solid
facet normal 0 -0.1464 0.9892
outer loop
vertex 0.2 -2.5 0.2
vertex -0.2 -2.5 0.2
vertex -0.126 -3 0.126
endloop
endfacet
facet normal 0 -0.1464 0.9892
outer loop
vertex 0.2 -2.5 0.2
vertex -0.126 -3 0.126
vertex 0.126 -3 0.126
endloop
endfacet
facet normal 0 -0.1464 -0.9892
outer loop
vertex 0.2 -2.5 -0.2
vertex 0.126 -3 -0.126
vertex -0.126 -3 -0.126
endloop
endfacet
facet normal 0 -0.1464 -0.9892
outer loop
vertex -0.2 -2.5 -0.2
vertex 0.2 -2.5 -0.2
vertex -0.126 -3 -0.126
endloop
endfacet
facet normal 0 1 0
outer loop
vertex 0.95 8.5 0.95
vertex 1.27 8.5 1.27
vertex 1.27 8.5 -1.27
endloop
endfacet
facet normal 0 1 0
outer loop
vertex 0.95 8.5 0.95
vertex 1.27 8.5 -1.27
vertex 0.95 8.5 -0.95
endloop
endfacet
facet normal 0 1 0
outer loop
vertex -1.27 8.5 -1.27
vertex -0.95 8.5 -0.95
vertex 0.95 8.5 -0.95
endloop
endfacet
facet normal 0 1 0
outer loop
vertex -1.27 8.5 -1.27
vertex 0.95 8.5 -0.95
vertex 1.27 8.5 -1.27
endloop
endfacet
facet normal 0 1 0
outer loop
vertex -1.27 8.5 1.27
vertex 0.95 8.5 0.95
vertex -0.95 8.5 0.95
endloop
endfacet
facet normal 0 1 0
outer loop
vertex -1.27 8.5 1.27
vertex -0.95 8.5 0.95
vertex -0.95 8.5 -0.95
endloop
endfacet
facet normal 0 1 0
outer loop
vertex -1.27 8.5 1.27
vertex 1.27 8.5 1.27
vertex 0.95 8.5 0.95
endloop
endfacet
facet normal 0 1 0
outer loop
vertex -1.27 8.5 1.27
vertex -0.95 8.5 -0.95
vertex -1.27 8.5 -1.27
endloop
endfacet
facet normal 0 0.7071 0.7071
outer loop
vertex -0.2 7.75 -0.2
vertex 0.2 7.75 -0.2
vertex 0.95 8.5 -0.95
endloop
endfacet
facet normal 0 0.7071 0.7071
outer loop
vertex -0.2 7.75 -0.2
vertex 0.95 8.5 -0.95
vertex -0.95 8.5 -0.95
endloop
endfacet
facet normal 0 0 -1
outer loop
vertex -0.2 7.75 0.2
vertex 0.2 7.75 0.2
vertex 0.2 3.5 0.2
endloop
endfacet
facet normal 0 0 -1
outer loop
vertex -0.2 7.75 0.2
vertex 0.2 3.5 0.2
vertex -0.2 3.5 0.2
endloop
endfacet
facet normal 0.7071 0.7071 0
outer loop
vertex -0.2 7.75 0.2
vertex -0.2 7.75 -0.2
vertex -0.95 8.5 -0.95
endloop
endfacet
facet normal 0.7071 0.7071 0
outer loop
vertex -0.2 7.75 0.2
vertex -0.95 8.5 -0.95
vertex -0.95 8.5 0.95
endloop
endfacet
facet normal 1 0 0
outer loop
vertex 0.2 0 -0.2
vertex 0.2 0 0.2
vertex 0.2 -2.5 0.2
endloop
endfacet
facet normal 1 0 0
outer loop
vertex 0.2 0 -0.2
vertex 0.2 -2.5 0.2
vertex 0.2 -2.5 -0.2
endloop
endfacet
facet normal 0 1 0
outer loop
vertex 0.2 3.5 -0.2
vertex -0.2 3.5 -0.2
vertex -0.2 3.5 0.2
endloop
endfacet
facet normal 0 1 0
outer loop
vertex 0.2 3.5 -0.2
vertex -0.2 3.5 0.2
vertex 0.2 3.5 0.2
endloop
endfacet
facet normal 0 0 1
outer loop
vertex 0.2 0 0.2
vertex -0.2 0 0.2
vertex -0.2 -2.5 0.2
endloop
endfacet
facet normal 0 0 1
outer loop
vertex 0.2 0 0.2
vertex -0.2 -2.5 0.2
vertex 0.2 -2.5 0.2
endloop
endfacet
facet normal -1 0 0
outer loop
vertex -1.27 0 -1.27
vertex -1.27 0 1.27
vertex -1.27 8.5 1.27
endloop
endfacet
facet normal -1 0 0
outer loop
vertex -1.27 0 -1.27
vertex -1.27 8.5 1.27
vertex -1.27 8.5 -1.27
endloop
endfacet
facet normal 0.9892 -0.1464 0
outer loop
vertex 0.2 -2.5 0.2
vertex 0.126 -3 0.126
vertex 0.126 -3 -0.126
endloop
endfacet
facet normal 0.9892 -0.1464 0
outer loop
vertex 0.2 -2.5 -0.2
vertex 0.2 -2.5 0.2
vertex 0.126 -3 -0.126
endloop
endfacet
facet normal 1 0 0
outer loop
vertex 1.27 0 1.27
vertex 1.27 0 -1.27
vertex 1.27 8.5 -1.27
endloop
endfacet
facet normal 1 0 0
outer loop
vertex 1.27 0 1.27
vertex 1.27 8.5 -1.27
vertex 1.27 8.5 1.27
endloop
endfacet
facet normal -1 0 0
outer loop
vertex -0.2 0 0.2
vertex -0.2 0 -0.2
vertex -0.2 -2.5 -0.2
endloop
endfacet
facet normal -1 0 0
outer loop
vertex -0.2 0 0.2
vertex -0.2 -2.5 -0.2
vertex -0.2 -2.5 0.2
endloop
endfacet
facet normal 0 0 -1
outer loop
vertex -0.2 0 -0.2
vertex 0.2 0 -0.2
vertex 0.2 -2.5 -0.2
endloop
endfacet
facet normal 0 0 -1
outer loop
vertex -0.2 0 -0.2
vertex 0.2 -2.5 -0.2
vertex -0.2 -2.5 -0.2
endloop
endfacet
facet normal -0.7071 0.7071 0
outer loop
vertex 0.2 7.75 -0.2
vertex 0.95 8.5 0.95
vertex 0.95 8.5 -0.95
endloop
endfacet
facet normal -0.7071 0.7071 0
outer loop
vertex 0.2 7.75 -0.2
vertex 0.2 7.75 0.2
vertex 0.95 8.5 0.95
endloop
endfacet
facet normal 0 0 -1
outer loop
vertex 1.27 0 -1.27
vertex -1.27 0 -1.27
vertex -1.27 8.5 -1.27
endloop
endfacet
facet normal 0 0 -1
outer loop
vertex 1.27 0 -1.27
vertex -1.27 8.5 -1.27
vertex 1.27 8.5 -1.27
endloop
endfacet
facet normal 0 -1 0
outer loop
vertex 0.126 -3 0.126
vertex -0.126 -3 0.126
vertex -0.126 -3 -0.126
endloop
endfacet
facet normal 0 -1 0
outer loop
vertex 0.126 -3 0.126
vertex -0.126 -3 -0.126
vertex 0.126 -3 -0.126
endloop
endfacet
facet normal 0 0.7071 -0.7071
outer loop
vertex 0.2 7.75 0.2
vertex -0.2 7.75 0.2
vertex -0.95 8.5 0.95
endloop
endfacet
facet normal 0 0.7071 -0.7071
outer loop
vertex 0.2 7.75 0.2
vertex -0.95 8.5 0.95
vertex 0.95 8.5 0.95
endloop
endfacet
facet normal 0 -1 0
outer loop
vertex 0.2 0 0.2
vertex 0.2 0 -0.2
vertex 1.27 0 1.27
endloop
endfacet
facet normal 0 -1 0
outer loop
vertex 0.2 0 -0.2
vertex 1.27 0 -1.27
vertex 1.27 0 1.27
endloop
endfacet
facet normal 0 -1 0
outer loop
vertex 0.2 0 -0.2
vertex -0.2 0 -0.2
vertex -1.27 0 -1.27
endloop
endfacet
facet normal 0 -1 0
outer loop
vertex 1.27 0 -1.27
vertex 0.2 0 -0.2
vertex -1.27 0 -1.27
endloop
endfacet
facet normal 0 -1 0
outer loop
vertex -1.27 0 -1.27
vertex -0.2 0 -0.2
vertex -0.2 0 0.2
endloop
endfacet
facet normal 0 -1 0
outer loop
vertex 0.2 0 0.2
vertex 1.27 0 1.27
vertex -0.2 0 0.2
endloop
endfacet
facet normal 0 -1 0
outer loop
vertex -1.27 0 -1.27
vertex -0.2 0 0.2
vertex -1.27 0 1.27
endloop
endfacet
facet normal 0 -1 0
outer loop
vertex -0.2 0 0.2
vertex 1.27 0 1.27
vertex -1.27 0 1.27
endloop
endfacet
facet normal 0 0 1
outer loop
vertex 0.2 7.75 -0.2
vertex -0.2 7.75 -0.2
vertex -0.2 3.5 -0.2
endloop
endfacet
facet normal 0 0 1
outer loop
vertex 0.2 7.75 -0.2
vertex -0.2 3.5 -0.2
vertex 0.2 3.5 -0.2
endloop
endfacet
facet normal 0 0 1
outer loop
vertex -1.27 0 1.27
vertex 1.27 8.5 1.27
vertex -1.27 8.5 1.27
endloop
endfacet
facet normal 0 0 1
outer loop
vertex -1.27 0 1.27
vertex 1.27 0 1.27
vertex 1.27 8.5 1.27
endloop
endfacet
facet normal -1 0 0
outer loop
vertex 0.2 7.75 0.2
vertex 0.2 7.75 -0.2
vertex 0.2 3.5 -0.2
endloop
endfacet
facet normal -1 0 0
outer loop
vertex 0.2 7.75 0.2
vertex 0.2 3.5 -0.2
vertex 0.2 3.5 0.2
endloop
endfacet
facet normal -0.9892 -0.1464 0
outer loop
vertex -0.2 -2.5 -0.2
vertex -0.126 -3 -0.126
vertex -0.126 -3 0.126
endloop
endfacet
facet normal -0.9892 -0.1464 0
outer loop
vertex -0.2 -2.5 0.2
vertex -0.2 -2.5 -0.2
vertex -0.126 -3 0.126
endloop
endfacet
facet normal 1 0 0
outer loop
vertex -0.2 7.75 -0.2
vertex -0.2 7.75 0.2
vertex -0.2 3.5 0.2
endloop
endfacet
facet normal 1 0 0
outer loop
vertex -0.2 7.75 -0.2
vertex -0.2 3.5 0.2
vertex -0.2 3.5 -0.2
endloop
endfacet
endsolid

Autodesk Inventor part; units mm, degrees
ref_plane "YZ Plane" through (0, 0, 0) normal (1, 0, 0) x (0, 1, 0)
ref_plane "XZ Plane" through (0, 0, 0) normal (0, 1, 0) x (-1, 0, 0)
ref_plane "XY Plane" through (0, 0, 0) normal (0, 0, 1) x (1, 0, 0)
sketch "Sketch1" plane through (0, 0, 0) normal (0, 1, 0) x (-1, 0, 0)
  line L0 (-1.27, 1.27) -> (1.27, 1.27)
  line L1 (1.27, 1.27) -> (1.27, -1.27)
  line L2 (1.27, -1.27) -> (-1.27, -1.27)
  line L3 (-1.27, -1.27) -> (-1.27, 1.27)
  line L4 (-1.27, 1.27) -> (1.27, -1.27) construction
  line L5 (1.27, 1.27) -> (-1.27, -1.27) construction
  point P0 (0, 0)
  dimension "d0" = 2.54
  dimension "d1" = 2.54
extrude "Extrusion1" add sketch "Sketch1" along normal blind 8.5
sketch "Sketch2" plane through (0, 8.5, 0) normal (0, 1, 0) x (1, 0, 0)
  line L0 (0.2, -0.2) -> (-0.2, -0.2)
  line L1 (-0.2, -0.2) -> (-0.2, 0.2)
  line L2 (-0.2, 0.2) -> (0.2, 0.2)
  line L3 (0.2, 0.2) -> (0.2, -0.2)
  line L4 (0.2, -0.2) -> (-0.2, 0.2) construction
  line L5 (-0.2, -0.2) -> (0.2, 0.2) construction
  point P0 (0, 0)
  dimension "d4" = 0.4
  dimension "d5" = 0.4
extrude "Extrusion2" cut sketch "Sketch2" against normal blind 5
chamfer "Chamfer1" distance 0.75 angle 45 4 edges at (0, 8.5, 0.2) (-0.2, 8.5, 0) (0, 8.5, -0.2) (0.2, 8.5, 0)
sketch "Sketch3" plane through (0, 0, 0) normal (0, -1, 0) x (1, 0, 0)
  line L0 (-0.2, 0.2) -> (0.2, 0.2)
  line L1 (0.2, 0.2) -> (0.2, -0.2)
  line L2 (0.2, -0.2) -> (-0.2, -0.2)
  line L3 (-0.2, -0.2) -> (-0.2, 0.2)
  line L4 (-0.2, 0.2) -> (0.2, -0.2) construction
  line L5 (0.2, 0.2) -> (-0.2, -0.2) construction
  point P0 (0, 0)
  dimension "d11" = 0.4
  dimension "d12" = 0.4
extrude "Extrusion3" add sketch "Sketch3" along normal blind 3
chamfer "Chamfer2" distance 0.074 distance2 0.5 1 edges at (-0.2, -3, 0) measured on face at (-0.0667, -3, 0.0667)
chamfer "Chamfer3" distance 0.074 distance2 0.5 1 edges at (0.2, -3, 0) measured on face at (-0.0173, -3, 0.0667)
chamfer "Chamfer4" distance 0.074 distance2 0.5 1 edges at (0, -3, 0.2) measured on face at (-0.042, -3, 0.0667)
chamfer "Chamfer5" distance 0.074 distance2 0.5 1 edges at (0, -3, -0.2) measured on face at (0.042, -3, -0.0913)
properties part number "FemaleHederPin"
